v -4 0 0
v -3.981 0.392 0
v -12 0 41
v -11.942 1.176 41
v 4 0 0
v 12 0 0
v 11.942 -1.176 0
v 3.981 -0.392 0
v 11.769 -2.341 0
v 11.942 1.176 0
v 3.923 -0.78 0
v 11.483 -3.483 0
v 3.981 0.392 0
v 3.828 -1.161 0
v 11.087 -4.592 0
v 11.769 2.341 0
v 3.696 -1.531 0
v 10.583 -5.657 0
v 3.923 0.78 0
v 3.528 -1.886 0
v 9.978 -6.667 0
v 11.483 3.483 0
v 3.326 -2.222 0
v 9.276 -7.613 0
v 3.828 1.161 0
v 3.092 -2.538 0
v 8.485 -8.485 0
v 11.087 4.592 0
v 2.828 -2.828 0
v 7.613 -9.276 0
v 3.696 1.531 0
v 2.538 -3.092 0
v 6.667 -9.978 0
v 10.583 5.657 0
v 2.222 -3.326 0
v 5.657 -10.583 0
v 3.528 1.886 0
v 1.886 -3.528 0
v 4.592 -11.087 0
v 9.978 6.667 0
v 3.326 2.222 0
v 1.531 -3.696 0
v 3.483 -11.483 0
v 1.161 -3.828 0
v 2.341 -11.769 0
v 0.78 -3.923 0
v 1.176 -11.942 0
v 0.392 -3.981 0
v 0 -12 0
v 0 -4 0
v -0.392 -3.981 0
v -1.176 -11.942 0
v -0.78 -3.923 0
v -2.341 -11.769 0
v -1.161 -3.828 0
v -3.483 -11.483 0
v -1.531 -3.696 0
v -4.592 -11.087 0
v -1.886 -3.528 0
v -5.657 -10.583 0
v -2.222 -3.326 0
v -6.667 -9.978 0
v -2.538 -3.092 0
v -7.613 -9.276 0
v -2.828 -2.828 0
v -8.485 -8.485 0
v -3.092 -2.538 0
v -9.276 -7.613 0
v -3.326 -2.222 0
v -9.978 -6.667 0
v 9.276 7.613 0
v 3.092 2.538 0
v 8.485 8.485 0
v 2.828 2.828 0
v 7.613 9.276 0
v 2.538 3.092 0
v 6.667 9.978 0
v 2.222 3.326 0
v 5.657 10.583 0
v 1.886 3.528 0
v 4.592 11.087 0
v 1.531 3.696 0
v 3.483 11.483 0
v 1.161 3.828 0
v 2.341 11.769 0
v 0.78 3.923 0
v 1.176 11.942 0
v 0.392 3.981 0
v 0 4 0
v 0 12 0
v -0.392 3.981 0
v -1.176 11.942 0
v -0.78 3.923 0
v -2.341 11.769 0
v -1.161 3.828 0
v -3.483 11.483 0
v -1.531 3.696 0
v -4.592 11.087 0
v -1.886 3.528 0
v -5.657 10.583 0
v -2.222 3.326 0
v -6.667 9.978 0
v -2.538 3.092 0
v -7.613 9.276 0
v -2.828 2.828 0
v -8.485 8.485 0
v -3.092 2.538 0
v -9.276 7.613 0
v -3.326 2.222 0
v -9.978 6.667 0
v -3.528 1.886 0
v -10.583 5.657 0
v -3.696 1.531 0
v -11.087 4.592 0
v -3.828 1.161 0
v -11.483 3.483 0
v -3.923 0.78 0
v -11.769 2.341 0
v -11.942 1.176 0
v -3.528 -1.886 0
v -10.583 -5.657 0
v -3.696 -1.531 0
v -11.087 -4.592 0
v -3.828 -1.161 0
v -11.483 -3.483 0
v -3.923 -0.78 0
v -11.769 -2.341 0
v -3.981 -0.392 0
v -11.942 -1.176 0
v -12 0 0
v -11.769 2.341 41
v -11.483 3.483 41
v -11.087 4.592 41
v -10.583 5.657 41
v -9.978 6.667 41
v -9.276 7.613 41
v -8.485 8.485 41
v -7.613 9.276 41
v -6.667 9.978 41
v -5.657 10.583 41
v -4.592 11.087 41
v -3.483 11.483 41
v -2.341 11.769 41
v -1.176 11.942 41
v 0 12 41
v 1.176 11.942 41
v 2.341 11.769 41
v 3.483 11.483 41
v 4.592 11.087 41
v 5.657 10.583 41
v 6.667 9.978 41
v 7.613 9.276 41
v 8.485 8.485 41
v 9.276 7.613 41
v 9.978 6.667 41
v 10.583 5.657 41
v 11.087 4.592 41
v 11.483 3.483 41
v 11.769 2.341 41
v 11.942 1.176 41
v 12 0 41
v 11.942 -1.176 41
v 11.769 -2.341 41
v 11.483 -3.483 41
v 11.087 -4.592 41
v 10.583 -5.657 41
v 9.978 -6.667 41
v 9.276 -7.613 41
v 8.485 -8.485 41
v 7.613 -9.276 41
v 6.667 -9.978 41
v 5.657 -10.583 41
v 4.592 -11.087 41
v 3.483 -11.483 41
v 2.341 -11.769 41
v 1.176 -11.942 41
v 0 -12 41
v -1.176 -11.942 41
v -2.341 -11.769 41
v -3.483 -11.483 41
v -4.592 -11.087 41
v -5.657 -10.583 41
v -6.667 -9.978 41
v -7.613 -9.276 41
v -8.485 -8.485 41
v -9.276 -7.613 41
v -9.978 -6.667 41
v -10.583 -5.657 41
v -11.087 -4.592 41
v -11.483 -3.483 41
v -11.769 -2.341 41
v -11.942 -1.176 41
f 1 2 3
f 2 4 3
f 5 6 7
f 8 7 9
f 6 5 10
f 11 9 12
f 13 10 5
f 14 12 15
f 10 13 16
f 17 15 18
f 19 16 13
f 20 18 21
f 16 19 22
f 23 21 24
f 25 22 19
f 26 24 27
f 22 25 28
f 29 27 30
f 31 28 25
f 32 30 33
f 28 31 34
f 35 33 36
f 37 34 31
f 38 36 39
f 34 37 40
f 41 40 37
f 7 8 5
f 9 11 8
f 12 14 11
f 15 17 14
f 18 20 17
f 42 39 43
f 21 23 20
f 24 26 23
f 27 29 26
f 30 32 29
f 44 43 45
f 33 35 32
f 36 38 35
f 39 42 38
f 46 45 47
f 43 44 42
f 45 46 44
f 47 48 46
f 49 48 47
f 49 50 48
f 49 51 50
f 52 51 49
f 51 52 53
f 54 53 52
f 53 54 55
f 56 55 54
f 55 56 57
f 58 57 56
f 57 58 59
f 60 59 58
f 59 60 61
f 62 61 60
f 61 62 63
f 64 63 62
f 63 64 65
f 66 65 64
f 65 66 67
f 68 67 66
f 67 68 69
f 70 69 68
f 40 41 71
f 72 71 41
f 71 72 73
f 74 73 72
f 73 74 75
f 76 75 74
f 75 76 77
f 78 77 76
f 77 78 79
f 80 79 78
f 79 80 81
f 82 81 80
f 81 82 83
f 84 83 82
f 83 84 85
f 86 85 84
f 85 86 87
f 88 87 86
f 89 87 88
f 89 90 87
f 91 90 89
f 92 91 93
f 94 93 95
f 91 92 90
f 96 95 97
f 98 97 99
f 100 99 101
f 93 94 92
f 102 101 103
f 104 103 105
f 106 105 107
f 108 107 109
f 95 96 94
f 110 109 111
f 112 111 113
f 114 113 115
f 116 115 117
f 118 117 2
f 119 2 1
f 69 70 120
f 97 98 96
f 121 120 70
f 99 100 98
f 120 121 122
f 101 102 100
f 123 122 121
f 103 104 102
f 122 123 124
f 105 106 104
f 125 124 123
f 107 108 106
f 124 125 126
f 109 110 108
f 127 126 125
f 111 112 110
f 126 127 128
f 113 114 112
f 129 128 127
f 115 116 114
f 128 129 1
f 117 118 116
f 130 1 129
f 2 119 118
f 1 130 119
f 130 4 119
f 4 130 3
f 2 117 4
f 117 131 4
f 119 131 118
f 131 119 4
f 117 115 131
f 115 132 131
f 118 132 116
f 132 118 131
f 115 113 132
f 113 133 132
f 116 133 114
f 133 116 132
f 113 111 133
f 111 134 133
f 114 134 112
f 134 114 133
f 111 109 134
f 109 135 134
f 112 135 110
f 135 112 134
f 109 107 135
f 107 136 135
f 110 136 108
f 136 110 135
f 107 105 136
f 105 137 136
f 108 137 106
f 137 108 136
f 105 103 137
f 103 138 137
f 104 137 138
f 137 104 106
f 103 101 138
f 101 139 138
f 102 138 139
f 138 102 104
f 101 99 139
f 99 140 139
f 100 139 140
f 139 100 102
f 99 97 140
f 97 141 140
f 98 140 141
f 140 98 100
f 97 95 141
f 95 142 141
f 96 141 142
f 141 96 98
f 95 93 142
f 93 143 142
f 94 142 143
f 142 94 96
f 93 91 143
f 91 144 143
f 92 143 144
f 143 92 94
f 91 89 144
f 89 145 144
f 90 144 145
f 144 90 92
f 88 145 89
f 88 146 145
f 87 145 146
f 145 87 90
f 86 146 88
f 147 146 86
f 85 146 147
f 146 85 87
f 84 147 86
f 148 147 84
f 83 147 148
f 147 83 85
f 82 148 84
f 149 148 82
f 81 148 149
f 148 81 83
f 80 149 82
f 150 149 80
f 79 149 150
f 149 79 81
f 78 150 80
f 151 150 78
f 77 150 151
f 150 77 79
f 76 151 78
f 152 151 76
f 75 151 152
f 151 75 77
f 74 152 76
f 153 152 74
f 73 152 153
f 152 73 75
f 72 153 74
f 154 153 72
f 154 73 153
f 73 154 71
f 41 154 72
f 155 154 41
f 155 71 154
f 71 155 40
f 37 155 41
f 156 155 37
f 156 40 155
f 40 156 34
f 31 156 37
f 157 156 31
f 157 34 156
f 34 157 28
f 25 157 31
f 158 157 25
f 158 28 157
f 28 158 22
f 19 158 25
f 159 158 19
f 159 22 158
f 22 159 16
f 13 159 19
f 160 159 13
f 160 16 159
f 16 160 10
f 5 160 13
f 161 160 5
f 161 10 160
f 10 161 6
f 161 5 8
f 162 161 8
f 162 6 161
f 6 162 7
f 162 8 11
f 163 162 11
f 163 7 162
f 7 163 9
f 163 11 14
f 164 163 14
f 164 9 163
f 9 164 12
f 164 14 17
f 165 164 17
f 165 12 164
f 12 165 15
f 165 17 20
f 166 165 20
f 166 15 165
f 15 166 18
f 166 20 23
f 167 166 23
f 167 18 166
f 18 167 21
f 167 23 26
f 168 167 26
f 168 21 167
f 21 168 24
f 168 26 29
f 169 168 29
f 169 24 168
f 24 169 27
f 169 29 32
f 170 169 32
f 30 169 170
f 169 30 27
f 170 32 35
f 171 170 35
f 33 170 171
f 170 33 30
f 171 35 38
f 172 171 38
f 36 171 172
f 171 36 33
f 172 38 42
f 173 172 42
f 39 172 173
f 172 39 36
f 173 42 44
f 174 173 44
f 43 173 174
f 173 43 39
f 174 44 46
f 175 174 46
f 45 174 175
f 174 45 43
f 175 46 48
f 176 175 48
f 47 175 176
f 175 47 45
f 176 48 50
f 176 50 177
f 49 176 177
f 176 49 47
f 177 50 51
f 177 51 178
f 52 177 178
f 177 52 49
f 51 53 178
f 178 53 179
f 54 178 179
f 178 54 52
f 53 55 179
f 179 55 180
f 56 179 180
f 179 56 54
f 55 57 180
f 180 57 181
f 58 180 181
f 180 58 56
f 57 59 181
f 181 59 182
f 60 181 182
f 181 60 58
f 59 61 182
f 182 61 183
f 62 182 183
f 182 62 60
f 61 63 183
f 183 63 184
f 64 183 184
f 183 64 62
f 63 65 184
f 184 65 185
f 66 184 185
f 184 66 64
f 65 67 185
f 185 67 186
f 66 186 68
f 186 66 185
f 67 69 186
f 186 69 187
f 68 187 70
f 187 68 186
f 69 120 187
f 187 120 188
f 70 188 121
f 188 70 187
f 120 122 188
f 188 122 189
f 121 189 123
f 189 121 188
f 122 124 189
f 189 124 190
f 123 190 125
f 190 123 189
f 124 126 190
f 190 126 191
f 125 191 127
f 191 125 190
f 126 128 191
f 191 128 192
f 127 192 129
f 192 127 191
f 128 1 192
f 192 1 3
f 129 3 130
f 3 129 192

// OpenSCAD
// Built by bench/smallmodels/features/compiler.py from a list of features.
$fn = 64;
difference() {
  union() {
    translate([0, 0, 0]) rotate_extrude() polygon([[4, 0], [12, 0], [12, 41]]);
  }
  union() {
    translate([0, 0, -1]) rotate([0, 0, 0]) cylinder(d = 3, h = 43);
  }
}
